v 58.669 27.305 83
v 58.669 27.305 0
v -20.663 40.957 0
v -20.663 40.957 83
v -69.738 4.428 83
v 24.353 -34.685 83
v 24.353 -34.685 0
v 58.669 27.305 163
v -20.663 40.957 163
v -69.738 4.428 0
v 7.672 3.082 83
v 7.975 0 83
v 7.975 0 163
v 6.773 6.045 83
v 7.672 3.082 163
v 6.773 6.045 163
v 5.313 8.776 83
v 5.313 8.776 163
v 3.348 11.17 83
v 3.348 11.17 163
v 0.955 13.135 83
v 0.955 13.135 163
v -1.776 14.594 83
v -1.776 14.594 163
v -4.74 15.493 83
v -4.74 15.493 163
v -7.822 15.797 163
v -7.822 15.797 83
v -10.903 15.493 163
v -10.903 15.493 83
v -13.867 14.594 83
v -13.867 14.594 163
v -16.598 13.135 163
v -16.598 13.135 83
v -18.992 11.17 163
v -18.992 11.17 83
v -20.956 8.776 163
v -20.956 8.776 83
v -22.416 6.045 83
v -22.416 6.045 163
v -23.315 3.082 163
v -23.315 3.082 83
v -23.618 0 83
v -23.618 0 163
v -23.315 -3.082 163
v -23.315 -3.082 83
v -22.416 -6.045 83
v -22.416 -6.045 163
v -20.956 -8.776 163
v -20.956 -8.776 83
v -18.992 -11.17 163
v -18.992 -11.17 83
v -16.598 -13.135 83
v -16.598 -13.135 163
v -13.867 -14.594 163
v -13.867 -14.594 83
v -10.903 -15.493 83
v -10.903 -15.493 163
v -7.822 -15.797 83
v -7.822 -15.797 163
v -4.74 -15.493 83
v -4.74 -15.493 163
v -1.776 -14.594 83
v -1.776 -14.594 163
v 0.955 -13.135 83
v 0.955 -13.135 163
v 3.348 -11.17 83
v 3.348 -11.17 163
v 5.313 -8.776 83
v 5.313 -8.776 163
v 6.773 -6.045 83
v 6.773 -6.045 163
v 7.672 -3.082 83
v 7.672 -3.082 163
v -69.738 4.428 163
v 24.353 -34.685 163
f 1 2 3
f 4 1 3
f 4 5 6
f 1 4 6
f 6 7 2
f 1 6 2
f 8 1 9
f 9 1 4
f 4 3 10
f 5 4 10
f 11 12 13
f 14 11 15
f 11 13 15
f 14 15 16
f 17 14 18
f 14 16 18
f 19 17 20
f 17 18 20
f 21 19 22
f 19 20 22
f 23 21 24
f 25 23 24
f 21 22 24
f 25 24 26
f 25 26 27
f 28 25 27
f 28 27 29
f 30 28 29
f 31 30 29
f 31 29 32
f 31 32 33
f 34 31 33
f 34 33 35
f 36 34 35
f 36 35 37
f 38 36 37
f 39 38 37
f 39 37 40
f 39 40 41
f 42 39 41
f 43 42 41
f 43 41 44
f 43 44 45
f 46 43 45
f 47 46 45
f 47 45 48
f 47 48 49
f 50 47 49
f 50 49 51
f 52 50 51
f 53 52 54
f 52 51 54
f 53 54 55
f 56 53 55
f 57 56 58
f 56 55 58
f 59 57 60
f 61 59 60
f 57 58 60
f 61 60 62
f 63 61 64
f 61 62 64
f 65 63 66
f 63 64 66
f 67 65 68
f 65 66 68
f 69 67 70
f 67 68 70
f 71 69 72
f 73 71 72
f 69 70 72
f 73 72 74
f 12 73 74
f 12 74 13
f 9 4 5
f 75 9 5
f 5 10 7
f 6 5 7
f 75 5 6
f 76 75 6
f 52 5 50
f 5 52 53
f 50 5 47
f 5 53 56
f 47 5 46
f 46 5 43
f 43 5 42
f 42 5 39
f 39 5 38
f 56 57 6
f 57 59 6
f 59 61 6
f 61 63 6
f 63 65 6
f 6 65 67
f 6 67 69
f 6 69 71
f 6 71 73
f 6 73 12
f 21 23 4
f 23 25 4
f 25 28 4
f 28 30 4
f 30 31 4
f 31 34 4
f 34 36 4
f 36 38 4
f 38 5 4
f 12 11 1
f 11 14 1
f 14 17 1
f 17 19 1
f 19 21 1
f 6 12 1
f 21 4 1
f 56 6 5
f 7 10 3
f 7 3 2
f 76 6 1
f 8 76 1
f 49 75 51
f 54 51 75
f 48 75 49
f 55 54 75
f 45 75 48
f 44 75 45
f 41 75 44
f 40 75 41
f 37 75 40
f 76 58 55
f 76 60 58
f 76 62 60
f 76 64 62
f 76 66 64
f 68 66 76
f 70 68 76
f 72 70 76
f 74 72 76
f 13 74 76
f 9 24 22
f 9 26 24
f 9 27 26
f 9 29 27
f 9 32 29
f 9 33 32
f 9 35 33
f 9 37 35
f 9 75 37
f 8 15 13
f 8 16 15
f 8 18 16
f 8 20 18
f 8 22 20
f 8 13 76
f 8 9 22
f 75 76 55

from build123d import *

# Parameters (mm, degrees)
F1_DEPTH = 83
F3_DEPTH = 80
F4_R     = 15.7967970704
F5_DEPTH = 261


# Not quite as in the source:
# - the program builds the solid bodies; features that only make, move or delete a surface that nothing else refers to are left out


with BuildPart() as f1:
    # F0 (on Top) → F1 (new body)
    with BuildSketch(Plane.XY):
        Polygon((-20.6632390618, 40.9574918449), (-69.738432765, 4.4278339483), (24.3531055748, -34.6847251058), (58.6688406765, 27.3049920797), align=None)
    extrude(amount=F1_DEPTH)


with BuildPart() as f3:
    # F3 (new): a face of the model
    f3_faces = [f1.part.faces().sort_by_distance(p)[0] for p in [
        (-0.5558487056, 7.3902608485, 83),
    ]]
    extrude(f3_faces, amount=F3_DEPTH)

    # F4 (on face) → F5 (cut)
    with BuildSketch(Plane.XY.offset(163)):
        with Locations((-7.8215794638, 0)):
            Circle(F4_R)
    extrude(amount=-F5_DEPTH, mode=Mode.SUBTRACT)


solid = Compound([f1.part, f3.part])
